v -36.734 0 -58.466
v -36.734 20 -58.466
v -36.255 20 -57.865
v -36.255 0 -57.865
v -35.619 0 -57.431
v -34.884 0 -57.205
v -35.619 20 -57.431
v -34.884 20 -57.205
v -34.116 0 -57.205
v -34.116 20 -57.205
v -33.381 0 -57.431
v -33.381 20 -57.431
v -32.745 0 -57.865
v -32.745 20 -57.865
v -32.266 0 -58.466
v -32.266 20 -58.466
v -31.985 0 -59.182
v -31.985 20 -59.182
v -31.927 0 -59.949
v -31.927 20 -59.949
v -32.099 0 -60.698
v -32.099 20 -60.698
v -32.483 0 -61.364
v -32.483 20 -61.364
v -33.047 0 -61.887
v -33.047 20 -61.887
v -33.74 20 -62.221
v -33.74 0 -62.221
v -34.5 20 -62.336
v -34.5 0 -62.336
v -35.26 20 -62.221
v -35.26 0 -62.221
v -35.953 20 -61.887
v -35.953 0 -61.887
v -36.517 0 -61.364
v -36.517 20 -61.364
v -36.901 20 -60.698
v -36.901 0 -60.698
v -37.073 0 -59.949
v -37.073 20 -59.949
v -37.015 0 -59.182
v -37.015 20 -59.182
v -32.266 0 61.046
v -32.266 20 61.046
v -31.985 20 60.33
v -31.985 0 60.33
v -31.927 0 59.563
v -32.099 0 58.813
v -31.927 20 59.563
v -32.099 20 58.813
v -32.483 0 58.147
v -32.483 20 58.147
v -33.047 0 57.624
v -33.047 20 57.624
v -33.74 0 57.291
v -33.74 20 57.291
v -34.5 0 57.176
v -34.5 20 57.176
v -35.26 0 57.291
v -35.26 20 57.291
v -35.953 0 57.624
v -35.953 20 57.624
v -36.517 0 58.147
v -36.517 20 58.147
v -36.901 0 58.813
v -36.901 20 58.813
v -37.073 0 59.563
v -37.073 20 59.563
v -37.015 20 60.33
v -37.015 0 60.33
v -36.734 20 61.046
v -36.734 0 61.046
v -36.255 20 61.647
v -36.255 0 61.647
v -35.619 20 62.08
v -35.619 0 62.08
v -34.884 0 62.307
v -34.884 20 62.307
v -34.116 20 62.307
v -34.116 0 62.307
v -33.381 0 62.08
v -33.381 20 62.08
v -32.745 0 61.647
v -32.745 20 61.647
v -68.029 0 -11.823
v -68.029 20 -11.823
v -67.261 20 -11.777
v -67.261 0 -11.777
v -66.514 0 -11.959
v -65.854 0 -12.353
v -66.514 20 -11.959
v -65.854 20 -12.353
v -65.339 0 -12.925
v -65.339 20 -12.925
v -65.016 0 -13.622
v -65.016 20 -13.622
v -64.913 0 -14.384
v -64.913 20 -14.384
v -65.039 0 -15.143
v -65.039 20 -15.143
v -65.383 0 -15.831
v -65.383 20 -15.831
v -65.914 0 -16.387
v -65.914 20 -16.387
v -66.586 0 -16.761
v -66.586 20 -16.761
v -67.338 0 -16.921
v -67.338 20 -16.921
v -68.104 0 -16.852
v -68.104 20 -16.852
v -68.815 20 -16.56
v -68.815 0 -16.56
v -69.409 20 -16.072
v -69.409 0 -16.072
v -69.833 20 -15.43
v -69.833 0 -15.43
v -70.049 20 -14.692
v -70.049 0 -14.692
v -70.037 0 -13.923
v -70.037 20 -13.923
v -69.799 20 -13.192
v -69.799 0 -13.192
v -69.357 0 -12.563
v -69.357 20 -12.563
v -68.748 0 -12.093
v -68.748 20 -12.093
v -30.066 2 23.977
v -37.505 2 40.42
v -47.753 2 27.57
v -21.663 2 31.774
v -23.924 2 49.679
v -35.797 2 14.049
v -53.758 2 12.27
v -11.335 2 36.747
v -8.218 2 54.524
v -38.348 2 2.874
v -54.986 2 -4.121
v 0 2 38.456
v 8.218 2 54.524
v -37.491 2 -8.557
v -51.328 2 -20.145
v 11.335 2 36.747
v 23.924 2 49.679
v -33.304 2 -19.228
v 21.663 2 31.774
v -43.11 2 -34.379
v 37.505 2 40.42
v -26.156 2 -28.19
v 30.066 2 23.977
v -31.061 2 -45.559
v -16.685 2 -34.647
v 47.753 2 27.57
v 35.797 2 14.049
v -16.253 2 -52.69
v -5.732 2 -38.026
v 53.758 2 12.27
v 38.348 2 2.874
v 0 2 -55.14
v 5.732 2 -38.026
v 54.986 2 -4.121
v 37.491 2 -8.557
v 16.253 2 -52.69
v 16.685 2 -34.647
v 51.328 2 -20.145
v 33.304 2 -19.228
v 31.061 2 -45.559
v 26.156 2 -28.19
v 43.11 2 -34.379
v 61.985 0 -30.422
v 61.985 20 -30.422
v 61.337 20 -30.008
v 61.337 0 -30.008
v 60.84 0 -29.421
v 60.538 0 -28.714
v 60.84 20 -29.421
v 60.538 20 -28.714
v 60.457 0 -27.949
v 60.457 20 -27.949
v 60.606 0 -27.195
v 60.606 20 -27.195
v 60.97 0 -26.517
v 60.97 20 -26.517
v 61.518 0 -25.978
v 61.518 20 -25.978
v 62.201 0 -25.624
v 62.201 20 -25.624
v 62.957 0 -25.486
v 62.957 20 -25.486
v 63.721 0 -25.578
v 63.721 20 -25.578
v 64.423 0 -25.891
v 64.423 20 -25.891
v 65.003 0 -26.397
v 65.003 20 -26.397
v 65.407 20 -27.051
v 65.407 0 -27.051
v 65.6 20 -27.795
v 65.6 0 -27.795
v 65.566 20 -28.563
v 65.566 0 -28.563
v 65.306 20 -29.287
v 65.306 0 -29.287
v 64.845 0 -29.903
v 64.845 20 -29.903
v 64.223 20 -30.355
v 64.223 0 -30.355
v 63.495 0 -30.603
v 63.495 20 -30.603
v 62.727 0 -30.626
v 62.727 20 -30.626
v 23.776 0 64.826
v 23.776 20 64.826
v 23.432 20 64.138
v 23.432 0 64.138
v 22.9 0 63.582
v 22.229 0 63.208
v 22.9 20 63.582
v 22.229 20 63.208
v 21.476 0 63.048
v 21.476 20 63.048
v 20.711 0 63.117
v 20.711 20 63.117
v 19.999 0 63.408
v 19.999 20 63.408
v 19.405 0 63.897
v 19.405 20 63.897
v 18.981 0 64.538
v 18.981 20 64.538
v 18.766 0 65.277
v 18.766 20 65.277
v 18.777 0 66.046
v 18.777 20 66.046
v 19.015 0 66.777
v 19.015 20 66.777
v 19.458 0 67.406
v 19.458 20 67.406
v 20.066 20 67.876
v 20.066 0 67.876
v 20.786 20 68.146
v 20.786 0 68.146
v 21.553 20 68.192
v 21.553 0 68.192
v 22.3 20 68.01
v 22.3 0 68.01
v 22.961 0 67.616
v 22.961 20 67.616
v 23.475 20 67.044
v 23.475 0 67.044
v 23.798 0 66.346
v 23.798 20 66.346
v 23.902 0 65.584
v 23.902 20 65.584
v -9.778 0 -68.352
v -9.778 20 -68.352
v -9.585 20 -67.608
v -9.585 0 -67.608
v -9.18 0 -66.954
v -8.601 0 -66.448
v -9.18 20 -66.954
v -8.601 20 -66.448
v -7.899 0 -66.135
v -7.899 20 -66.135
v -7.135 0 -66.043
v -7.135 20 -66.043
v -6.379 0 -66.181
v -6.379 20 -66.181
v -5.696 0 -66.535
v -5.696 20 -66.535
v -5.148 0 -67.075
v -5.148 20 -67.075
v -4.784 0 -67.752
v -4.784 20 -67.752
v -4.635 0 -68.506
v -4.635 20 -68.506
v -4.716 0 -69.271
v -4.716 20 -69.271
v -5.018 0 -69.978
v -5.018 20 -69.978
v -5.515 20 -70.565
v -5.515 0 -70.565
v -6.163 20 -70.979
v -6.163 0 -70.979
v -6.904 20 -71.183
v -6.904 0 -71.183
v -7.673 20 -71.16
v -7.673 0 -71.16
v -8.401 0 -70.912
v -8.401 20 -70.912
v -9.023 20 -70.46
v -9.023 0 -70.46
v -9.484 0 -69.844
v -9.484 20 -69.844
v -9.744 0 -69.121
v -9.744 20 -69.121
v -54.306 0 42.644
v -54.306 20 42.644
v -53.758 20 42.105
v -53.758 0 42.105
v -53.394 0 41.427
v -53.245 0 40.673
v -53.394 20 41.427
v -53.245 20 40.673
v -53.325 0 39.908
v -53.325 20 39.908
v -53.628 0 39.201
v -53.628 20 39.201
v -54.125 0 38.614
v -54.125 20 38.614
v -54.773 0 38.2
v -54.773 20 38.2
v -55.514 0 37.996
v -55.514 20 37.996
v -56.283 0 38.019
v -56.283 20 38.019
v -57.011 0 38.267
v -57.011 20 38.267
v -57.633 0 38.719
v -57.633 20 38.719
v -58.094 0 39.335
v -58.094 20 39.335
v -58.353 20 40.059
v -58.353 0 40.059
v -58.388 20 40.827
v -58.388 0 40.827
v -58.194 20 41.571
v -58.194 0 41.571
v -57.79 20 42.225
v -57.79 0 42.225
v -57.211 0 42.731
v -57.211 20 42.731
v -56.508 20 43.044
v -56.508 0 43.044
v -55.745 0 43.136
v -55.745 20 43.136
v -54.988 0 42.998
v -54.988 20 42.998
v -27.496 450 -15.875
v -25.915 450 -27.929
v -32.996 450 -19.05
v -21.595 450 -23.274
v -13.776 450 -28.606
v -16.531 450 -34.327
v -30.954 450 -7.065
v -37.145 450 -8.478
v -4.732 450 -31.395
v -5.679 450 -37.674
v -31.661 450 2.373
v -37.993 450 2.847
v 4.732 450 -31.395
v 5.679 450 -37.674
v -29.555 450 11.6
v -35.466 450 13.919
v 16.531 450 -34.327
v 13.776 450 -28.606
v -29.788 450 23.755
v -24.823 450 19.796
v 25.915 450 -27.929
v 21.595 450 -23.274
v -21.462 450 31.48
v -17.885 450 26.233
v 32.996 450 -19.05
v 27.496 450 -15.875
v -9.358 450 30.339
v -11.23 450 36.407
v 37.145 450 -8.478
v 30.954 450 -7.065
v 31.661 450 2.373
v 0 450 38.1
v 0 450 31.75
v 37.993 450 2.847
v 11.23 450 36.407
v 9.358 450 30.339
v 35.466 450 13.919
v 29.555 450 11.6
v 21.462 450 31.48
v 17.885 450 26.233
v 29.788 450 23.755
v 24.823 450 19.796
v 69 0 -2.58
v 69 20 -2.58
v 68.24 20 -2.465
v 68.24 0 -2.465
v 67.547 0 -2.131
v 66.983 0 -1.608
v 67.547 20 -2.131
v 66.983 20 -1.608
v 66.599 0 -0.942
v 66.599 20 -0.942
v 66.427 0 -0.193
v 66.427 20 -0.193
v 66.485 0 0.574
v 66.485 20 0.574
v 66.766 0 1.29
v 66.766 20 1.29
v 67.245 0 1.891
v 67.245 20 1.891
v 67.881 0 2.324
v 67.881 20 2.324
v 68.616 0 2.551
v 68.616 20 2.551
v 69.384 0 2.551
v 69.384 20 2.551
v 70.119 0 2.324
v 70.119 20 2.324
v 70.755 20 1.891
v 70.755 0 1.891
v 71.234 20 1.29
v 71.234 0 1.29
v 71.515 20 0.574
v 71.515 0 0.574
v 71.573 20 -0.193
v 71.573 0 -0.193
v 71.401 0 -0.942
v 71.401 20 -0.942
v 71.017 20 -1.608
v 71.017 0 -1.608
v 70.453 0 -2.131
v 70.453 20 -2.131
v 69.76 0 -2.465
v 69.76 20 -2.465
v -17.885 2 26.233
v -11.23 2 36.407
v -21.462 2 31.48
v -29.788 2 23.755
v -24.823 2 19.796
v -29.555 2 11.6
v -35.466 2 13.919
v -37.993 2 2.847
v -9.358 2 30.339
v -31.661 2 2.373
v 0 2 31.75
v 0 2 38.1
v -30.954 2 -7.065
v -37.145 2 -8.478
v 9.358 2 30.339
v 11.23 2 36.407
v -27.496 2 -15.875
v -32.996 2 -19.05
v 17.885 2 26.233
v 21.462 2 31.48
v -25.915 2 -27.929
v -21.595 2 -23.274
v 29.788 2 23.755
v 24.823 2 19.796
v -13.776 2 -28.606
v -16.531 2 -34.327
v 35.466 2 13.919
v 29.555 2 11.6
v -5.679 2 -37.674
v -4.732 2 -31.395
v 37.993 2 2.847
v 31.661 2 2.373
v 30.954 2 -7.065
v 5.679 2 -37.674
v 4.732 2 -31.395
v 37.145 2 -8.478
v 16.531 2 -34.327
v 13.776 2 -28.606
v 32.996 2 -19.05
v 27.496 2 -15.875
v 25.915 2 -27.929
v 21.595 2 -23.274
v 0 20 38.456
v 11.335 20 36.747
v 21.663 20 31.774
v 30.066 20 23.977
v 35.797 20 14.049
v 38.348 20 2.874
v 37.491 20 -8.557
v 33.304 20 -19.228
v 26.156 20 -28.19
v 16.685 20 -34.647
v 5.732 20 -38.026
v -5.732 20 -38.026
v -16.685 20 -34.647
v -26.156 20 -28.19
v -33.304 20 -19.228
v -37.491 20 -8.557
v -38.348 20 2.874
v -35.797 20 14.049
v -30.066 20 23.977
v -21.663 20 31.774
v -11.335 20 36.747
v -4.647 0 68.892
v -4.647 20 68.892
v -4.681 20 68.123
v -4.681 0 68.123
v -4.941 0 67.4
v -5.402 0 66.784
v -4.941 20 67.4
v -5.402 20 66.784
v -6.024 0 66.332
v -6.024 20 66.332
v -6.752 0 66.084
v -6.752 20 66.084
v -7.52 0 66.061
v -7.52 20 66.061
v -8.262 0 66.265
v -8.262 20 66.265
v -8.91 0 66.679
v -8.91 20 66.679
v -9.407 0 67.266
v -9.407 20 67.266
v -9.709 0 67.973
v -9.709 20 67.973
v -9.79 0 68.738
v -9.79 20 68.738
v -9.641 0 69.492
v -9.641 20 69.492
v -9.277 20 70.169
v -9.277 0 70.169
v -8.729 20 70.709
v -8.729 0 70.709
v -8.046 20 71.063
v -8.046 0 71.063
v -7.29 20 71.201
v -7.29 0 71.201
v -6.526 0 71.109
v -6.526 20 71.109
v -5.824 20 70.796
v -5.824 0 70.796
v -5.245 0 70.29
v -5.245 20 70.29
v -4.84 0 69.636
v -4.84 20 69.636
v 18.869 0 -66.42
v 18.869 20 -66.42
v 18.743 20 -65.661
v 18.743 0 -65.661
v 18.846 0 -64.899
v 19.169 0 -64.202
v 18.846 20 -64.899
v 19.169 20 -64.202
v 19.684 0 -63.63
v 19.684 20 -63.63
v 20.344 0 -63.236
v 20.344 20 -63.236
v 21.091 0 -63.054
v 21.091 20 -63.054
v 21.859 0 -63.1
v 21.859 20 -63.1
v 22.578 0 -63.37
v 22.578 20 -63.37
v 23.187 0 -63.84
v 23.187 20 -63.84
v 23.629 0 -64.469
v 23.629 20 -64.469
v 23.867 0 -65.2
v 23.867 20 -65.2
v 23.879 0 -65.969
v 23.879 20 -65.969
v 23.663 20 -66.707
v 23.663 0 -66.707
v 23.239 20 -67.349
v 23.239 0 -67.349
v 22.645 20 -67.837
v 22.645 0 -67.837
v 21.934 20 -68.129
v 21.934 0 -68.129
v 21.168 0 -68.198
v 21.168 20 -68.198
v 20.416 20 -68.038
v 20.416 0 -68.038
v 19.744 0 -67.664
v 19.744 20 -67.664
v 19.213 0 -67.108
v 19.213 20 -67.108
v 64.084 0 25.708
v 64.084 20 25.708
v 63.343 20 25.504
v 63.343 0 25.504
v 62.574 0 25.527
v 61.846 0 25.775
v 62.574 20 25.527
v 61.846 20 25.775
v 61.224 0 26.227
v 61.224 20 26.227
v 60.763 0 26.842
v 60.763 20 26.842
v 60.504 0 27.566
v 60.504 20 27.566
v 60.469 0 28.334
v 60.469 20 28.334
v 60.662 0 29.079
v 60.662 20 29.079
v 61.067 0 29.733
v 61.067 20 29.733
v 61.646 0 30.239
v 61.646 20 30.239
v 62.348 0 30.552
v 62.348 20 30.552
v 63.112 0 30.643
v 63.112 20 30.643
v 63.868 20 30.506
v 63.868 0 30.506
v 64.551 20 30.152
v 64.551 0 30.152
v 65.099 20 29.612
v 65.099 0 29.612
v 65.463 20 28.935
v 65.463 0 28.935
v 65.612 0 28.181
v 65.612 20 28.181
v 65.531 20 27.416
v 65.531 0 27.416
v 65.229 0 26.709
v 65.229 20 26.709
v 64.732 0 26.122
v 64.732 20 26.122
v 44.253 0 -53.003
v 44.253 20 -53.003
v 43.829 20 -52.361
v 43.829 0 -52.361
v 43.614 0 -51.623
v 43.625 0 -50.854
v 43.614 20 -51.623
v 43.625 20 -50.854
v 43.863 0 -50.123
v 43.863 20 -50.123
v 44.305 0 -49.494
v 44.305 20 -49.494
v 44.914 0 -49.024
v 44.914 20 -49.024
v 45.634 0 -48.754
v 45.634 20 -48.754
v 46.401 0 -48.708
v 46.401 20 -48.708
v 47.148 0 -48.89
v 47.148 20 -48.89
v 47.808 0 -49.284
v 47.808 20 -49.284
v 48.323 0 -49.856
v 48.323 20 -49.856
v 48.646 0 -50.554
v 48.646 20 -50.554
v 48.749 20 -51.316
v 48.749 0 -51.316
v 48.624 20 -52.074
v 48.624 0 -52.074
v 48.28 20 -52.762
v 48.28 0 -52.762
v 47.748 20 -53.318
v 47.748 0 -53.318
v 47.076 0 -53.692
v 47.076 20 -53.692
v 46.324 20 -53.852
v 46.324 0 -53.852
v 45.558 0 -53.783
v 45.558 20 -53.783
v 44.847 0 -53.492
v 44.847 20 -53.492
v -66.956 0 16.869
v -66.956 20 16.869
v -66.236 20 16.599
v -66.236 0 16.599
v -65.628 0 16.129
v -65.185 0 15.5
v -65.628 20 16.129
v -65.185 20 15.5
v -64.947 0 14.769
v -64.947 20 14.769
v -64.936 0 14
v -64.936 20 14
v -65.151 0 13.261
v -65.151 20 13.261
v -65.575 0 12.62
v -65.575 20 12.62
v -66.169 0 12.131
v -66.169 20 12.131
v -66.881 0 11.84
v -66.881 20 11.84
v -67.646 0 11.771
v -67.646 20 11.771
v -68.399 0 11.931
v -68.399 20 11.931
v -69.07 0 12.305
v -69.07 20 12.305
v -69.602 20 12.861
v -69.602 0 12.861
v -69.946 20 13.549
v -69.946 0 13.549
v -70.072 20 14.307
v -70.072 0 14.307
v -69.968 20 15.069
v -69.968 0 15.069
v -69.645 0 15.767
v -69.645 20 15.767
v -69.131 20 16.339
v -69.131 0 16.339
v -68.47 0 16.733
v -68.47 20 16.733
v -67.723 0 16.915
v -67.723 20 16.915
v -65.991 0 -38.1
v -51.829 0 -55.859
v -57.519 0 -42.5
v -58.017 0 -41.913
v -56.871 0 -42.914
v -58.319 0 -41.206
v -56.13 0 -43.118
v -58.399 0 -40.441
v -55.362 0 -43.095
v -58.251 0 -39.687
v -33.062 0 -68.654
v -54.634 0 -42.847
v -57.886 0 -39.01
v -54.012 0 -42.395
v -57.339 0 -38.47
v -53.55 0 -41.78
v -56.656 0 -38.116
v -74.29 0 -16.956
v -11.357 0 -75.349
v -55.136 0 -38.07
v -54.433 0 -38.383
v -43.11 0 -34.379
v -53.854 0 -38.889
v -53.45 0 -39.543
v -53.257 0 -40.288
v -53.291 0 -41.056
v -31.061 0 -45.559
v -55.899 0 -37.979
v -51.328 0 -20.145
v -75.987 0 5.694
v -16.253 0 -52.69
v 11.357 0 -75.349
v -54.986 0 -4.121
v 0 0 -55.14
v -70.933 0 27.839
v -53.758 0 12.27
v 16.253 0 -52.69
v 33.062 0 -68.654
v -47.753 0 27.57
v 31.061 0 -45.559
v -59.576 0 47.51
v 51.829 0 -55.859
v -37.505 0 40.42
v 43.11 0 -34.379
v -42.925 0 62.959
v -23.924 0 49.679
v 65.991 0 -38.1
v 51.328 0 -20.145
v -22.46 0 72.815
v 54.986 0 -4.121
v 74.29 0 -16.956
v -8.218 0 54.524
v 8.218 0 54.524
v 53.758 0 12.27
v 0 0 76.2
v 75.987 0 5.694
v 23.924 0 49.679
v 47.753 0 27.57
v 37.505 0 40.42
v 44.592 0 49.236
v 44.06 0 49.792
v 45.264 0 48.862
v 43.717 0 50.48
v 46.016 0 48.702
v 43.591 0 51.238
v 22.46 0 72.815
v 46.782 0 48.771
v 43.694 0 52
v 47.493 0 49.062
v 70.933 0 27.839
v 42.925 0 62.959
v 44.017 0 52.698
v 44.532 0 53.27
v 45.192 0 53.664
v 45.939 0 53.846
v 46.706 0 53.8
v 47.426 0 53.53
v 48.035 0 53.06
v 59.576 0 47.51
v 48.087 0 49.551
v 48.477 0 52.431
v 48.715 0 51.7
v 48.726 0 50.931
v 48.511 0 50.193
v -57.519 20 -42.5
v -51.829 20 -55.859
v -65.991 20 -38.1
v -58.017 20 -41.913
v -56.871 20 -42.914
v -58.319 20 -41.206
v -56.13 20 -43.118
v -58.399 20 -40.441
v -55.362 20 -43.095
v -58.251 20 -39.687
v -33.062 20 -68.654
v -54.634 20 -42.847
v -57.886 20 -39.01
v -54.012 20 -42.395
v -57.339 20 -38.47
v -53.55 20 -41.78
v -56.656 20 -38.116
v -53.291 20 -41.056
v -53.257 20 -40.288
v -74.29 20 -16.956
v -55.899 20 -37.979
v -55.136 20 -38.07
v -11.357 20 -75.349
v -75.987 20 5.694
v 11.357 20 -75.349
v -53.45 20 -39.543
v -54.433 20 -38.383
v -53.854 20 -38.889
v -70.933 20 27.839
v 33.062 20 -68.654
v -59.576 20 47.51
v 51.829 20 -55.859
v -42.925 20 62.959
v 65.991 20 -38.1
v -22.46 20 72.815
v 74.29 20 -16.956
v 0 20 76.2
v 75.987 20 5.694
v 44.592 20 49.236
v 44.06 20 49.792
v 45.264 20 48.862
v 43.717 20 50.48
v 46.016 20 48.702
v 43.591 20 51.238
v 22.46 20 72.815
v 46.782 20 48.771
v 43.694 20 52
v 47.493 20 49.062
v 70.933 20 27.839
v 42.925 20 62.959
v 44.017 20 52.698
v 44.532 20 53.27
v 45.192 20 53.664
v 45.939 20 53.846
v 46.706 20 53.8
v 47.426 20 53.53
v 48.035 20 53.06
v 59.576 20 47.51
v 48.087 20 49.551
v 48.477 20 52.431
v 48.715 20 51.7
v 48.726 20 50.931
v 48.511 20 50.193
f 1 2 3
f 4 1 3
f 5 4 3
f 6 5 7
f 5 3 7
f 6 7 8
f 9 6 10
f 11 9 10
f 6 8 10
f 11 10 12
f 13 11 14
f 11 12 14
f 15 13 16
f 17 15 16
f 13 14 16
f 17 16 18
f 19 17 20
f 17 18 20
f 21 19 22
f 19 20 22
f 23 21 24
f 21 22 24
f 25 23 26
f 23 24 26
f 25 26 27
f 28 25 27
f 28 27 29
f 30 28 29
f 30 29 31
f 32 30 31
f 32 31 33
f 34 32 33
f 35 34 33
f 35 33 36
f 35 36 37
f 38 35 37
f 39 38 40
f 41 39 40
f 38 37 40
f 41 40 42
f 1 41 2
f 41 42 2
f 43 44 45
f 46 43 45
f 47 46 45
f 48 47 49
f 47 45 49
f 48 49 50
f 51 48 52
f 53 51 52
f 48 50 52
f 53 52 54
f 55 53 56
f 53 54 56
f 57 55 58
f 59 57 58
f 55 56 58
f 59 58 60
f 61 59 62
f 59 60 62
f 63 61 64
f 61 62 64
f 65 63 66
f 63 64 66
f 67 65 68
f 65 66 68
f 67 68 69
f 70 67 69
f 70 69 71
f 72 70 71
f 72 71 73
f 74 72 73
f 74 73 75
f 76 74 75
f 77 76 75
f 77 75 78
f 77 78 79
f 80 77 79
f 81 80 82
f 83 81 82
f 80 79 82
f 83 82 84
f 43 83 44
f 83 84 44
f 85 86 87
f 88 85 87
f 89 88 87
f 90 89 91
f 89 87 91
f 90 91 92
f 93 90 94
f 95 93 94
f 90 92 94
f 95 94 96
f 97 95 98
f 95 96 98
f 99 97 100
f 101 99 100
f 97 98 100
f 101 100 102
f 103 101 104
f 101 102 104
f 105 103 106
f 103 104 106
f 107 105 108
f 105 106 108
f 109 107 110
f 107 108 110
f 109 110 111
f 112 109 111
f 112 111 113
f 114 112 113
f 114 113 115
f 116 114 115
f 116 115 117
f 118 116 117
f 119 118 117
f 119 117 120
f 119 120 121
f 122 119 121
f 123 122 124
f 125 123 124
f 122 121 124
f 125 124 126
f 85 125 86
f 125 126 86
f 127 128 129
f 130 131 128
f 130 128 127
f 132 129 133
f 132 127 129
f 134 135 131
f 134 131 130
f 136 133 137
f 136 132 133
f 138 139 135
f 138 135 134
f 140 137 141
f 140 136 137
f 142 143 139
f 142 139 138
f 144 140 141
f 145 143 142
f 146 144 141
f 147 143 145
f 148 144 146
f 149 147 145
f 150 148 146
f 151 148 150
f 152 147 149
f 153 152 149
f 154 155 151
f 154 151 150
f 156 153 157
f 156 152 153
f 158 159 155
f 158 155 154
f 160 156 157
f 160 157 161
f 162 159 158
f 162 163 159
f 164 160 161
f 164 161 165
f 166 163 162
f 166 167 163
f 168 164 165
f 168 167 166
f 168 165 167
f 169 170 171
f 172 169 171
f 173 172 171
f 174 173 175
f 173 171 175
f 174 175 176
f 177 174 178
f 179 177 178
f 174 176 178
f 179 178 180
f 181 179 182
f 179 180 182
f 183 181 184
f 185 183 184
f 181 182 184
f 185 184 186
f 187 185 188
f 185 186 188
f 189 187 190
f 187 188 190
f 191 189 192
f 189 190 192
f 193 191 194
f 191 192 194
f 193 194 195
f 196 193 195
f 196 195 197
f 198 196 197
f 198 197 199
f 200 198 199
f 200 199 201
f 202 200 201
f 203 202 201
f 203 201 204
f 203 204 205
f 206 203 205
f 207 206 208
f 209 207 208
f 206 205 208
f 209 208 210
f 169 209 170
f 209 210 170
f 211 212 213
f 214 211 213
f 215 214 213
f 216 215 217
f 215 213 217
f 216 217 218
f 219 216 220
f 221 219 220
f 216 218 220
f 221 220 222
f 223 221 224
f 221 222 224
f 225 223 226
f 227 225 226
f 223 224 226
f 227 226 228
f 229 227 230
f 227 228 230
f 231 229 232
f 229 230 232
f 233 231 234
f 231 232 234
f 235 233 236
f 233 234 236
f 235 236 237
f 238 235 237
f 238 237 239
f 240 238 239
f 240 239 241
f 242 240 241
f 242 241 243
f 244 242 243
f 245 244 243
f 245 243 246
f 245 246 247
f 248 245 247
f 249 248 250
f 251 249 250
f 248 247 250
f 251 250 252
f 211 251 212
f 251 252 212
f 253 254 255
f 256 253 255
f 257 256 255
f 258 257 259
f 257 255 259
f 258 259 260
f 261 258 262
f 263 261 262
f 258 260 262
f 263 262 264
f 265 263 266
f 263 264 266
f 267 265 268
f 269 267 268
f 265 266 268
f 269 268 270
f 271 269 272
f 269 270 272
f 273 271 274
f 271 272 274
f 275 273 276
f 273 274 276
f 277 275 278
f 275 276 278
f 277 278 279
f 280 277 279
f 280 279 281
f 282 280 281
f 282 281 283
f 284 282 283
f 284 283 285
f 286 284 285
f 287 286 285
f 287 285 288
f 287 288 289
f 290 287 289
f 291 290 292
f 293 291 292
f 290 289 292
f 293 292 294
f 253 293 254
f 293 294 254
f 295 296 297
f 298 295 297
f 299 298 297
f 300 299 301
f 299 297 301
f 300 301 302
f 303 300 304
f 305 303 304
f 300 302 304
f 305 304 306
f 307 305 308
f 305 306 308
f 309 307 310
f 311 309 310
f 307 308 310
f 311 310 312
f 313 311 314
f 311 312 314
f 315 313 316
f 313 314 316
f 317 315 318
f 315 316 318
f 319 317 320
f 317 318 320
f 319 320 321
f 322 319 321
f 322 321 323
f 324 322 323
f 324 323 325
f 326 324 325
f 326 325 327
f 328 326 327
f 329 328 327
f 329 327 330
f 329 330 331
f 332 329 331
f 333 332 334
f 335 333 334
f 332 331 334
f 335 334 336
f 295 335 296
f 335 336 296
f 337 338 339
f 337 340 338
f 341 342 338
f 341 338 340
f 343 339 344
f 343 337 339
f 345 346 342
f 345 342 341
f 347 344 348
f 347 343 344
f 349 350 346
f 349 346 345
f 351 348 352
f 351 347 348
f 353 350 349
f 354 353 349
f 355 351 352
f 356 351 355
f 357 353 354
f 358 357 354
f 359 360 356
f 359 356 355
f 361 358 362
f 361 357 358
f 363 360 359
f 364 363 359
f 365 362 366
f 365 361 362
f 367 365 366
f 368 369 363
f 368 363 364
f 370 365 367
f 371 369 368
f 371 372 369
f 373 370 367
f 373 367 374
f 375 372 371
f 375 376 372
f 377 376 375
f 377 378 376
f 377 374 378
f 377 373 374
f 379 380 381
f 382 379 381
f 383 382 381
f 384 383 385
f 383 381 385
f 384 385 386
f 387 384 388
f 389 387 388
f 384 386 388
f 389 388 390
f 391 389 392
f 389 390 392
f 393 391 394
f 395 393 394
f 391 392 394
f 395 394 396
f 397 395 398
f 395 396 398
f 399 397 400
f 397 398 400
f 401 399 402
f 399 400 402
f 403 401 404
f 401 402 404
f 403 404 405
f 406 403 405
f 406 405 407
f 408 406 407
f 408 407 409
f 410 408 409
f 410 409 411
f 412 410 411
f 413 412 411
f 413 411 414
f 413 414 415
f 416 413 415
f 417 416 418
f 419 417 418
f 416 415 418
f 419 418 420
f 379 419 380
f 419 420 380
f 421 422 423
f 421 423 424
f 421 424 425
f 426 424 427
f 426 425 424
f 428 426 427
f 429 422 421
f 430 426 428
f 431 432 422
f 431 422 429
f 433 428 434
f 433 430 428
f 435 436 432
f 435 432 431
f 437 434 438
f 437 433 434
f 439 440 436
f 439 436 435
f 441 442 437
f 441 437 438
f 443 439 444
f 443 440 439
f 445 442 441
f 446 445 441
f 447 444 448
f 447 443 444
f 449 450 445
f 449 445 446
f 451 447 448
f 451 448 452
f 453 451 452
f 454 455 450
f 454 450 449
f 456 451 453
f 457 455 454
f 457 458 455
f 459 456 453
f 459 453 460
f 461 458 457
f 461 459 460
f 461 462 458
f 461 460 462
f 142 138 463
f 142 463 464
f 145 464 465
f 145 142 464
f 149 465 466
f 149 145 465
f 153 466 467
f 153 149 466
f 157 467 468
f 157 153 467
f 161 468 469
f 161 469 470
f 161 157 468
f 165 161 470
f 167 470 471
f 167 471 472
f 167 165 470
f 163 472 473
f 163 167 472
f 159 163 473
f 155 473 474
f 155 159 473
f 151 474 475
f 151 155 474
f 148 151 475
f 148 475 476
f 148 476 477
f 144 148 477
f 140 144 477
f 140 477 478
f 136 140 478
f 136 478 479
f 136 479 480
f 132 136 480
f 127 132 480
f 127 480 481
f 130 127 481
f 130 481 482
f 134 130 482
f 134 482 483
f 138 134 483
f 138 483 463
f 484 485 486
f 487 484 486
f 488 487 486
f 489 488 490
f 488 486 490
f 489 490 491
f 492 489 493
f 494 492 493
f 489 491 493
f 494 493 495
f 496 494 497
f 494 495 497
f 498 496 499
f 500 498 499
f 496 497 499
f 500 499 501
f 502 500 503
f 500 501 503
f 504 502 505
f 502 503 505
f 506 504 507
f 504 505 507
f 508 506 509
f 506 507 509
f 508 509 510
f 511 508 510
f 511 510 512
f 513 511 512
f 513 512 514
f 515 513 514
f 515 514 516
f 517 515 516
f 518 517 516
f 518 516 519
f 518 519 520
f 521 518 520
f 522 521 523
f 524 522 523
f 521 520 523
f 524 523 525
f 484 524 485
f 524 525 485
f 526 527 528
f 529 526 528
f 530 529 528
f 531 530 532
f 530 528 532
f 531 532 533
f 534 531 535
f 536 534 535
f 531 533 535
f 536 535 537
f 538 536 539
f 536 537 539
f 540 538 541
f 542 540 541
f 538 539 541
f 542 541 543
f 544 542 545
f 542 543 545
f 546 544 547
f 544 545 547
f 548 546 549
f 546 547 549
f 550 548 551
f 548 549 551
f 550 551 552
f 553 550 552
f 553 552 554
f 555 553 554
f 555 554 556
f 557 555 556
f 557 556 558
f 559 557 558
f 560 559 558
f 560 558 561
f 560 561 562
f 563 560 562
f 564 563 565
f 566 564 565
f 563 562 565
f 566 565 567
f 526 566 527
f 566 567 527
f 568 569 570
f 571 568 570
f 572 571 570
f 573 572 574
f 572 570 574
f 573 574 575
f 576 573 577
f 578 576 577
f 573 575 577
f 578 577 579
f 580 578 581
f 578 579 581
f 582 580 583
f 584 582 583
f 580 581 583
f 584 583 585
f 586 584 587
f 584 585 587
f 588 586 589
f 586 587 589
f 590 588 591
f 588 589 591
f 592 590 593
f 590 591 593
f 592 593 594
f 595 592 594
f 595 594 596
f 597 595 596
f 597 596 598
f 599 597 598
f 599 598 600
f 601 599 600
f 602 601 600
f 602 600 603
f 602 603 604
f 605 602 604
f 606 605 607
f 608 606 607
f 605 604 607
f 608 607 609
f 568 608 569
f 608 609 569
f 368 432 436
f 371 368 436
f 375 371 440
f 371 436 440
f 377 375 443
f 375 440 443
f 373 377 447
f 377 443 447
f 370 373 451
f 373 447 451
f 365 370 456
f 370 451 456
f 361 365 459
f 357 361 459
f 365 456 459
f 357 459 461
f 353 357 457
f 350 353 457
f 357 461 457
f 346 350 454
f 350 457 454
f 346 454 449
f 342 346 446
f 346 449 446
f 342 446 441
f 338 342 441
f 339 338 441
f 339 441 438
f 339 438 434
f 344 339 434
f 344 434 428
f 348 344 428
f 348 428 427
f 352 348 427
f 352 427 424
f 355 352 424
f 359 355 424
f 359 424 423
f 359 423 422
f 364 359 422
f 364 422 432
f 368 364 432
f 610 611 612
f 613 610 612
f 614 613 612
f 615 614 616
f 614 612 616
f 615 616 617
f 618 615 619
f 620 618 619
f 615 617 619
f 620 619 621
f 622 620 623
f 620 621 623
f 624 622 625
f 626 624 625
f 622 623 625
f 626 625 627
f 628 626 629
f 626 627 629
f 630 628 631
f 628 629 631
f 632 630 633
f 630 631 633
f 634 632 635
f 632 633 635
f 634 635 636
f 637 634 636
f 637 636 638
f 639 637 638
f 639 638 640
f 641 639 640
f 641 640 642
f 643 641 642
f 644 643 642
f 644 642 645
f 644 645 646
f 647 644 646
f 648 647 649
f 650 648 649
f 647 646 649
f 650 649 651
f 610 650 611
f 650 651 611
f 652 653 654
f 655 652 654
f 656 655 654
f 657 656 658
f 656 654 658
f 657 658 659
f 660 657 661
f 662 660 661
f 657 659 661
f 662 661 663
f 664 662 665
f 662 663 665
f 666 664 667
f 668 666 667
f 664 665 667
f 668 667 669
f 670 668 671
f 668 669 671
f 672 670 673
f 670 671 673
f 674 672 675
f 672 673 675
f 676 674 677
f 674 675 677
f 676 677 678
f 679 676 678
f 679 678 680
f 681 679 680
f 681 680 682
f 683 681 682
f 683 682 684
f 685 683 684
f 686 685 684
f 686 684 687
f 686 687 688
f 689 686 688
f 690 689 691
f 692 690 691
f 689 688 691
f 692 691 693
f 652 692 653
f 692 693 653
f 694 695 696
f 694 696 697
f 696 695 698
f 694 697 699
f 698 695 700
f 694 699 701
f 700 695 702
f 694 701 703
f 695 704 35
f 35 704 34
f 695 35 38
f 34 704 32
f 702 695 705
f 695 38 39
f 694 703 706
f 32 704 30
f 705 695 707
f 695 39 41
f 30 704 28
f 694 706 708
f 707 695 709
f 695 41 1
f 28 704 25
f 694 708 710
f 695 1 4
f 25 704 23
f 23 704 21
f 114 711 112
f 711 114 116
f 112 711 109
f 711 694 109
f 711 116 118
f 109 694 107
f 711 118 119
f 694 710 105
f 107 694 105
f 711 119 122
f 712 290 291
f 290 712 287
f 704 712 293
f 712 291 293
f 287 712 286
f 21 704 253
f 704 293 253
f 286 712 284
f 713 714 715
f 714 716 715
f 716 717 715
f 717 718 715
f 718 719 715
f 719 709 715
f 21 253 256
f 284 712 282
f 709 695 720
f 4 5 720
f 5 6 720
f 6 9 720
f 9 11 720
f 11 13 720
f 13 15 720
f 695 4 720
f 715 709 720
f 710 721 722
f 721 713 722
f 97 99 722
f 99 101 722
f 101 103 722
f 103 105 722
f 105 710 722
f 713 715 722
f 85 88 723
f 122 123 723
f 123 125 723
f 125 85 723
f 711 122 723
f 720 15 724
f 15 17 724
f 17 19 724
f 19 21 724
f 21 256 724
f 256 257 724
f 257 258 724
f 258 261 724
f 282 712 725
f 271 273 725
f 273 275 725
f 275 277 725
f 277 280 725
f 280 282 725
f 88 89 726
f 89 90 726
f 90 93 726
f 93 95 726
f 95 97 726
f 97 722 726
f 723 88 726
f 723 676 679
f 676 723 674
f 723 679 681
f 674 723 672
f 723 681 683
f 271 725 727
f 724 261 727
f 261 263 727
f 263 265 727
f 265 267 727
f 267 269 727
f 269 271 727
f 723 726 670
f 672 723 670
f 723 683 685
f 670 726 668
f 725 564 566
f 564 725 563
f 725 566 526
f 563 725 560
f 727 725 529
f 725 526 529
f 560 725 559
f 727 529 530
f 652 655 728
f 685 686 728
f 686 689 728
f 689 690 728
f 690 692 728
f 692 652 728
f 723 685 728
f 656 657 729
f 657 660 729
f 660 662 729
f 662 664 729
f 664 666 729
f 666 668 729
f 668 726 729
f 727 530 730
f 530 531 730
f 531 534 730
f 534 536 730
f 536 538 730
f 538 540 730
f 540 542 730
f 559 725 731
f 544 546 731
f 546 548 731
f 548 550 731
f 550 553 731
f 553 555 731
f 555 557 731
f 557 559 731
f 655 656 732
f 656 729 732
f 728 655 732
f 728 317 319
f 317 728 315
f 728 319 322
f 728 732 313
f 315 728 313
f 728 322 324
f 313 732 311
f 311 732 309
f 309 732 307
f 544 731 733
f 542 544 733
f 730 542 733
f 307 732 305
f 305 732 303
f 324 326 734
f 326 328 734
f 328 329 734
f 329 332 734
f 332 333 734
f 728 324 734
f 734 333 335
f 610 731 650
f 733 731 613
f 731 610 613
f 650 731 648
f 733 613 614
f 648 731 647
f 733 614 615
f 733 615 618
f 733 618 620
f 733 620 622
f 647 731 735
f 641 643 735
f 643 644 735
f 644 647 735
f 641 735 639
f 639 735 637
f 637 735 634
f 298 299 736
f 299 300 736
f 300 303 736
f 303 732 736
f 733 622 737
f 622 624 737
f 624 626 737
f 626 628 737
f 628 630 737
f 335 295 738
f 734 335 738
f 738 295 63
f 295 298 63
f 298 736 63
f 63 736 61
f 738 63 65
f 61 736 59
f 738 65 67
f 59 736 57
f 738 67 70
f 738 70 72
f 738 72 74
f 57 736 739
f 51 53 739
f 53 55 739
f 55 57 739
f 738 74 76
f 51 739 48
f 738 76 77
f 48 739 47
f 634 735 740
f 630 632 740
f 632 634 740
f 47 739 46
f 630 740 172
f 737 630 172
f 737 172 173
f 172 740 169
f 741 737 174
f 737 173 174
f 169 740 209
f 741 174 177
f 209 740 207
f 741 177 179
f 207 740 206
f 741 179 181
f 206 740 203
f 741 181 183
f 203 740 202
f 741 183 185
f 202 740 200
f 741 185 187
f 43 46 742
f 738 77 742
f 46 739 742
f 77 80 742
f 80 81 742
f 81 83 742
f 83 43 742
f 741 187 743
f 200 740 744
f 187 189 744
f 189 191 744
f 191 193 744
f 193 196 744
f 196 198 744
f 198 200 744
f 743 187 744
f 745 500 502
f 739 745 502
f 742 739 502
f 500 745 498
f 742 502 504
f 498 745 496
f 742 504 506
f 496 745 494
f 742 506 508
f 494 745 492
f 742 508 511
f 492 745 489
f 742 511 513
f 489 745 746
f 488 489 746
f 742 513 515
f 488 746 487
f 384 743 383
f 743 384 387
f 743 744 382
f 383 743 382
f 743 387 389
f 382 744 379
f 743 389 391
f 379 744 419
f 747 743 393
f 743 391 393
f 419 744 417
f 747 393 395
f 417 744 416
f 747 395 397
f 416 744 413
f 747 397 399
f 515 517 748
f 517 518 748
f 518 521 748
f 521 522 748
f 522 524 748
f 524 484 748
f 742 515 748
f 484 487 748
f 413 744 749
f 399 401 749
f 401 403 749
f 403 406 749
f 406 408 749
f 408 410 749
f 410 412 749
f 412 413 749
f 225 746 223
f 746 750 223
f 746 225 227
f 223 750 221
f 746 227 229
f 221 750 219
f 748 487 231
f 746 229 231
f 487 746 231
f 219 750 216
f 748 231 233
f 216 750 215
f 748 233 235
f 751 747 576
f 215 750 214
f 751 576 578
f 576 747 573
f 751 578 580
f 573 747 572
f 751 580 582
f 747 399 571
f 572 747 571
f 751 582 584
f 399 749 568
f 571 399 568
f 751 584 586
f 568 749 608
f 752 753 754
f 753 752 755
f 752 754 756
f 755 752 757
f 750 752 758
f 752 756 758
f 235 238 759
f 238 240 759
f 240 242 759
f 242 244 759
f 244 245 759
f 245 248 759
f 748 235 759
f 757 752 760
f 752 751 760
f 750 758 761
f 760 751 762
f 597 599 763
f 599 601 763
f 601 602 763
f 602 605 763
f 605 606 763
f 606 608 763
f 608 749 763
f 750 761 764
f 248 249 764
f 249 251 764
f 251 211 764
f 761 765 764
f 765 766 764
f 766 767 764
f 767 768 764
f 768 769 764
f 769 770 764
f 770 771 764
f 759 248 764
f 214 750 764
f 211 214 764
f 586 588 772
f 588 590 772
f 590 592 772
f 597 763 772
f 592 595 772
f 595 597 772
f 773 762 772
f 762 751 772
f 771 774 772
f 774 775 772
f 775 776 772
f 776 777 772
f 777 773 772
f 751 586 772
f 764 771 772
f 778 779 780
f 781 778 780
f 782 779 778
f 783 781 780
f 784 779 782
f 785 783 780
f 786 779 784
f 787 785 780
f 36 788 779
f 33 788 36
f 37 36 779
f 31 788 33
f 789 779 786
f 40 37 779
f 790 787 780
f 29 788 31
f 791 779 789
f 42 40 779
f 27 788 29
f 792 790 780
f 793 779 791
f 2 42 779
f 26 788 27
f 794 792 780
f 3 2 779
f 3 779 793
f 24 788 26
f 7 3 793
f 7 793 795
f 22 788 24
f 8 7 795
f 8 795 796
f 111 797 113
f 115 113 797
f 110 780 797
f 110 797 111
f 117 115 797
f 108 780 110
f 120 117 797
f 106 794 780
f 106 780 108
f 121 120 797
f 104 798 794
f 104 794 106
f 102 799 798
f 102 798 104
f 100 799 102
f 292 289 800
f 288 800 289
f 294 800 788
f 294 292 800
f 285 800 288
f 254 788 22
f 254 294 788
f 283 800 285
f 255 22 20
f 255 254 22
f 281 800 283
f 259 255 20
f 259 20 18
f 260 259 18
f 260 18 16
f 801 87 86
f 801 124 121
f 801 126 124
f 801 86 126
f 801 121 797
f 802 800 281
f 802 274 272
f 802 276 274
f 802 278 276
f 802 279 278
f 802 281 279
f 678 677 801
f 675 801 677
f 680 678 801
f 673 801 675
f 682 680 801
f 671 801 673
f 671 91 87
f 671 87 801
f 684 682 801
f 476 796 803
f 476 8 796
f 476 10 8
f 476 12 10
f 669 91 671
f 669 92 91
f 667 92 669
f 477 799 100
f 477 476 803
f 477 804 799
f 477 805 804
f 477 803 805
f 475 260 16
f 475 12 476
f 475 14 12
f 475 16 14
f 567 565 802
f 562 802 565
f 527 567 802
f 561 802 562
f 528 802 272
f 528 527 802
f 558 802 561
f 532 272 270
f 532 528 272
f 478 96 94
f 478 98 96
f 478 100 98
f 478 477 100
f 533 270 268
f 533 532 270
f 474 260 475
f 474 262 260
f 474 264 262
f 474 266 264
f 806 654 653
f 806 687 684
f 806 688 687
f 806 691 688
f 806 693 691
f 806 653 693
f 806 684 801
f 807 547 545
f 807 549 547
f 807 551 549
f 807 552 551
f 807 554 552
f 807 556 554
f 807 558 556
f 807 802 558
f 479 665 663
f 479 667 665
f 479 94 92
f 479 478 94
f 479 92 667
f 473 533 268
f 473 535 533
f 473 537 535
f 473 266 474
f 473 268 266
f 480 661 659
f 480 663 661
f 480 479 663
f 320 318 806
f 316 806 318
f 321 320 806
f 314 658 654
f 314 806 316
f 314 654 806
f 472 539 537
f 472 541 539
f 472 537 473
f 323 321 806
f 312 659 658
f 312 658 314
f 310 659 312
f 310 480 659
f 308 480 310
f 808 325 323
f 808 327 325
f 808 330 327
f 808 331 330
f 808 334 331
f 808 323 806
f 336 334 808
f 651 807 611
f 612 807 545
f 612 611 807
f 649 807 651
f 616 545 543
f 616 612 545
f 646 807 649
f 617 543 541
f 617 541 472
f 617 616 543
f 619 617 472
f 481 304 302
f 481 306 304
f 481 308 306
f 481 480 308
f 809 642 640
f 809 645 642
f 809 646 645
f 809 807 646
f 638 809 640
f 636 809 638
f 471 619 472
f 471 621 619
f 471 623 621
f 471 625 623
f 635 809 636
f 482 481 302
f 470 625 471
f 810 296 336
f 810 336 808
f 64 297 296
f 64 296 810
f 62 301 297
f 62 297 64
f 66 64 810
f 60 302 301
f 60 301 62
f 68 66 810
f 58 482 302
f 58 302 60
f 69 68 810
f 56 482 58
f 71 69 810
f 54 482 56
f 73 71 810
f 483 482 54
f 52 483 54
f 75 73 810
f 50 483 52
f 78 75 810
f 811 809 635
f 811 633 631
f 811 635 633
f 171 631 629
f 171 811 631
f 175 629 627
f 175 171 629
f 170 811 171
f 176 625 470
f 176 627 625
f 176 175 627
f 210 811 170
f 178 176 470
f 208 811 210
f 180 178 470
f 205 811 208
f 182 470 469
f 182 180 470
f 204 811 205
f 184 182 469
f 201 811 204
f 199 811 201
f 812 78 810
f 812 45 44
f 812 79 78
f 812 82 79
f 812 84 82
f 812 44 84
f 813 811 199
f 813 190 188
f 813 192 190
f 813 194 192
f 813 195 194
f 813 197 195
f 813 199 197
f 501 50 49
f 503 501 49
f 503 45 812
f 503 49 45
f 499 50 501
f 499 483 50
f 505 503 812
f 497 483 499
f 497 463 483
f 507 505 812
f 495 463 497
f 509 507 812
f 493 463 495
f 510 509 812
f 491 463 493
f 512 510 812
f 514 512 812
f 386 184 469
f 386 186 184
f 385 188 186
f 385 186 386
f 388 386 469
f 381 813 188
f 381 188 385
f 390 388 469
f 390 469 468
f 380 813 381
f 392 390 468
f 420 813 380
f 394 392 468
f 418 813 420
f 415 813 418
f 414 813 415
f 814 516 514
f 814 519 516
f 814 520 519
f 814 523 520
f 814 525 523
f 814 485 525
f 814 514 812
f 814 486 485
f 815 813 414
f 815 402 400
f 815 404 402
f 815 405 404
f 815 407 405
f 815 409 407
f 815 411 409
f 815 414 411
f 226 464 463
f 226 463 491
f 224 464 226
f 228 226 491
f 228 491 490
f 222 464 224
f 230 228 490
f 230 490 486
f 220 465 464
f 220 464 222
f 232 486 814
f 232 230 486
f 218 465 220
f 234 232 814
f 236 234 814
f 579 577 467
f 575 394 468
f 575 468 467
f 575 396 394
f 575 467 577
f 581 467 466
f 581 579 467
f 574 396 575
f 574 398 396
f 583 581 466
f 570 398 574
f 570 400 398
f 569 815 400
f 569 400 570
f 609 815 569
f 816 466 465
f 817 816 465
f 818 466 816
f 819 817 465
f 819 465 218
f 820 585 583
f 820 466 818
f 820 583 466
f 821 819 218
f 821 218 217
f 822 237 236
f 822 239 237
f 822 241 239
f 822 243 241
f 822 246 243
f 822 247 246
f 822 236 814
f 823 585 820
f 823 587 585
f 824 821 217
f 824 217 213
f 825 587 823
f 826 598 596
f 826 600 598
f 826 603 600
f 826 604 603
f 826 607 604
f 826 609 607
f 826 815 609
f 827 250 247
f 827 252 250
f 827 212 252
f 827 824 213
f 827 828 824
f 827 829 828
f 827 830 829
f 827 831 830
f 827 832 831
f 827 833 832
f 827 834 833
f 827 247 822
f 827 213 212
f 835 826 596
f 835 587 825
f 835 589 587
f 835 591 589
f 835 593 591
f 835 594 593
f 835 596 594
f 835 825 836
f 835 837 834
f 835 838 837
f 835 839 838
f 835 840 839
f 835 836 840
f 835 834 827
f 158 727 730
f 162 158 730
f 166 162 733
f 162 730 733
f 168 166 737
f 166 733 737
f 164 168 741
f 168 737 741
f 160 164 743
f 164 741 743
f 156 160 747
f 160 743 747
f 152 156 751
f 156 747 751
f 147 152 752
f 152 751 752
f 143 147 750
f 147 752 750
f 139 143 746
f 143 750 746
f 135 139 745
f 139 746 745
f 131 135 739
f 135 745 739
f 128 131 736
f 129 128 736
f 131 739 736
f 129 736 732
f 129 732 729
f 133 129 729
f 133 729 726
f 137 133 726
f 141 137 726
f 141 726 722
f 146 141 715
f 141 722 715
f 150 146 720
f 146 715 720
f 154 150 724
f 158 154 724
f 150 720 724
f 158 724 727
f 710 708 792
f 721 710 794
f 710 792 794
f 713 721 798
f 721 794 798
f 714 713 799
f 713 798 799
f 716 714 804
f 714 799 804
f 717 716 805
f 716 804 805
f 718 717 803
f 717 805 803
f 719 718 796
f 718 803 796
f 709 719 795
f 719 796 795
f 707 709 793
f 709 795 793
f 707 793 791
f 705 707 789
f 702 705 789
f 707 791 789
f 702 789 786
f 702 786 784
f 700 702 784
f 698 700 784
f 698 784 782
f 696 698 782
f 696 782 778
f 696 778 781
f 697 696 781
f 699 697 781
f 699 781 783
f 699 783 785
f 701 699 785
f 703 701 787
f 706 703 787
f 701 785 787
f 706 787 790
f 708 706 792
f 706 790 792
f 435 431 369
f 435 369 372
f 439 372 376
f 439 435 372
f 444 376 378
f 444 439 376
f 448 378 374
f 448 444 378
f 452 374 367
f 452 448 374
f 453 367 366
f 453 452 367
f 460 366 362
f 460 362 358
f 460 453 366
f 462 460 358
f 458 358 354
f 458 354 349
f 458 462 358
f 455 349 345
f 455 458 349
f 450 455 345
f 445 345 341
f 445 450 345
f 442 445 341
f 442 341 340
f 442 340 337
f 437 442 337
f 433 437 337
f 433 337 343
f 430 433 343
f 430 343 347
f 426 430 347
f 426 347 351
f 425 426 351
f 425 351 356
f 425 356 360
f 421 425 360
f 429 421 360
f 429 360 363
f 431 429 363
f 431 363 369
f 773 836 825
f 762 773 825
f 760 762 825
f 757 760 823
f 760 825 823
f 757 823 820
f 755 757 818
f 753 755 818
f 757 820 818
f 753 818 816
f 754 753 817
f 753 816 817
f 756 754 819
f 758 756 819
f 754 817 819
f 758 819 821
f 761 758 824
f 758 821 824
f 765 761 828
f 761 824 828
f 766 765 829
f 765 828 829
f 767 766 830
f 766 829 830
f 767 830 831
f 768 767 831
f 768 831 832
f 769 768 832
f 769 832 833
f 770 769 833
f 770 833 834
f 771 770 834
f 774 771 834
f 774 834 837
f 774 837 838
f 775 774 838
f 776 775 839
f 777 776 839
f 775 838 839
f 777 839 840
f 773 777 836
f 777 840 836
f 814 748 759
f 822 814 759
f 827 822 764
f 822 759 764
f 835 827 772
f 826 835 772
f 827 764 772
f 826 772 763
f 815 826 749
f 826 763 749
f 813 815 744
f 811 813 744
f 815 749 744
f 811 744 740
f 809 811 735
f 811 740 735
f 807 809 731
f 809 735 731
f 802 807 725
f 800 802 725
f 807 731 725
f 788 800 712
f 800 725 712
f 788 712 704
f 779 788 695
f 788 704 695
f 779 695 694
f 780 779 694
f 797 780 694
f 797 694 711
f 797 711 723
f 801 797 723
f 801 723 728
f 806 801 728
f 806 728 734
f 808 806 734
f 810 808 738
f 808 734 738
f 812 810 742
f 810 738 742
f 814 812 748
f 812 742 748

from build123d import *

# Parameters (mm, degrees)
SKETCH1_R           = 38.1
SKETCH1_R_2         = 31.75
BOSS_EXTRUDE1_DEPTH = 450
SKETCH2_R           = 76.2
SKETCH2_R_2         = 38.4556
BOSS_EXTRUDE2_DEPTH = 20
SKETCH5_W           = 2.579751
SKETCH5_H           = 450
CIRPATTERN1_COUNT   = 15
SKETCH6_R           = 55.14
CUT_EXTRUDE1_DEPTH  = 2


with BuildPart() as part:
    # Sketch1 → Boss-Extrude1 (new body)
    with BuildSketch(Plane(origin=(0, 0, 0), x_dir=(1, 0, 0), z_dir=(0, 1, 0))):
        Circle(SKETCH1_R)
        Circle(SKETCH1_R_2, mode=Mode.SUBTRACT)
    extrude(amount=BOSS_EXTRUDE1_DEPTH)


with BuildPart() as body_2:
    # Sketch2 → Boss-Extrude2 (new body)
    with BuildSketch(Plane(origin=(0, 0, 0), x_dir=(1, 0, 0), z_dir=(0, 1, 0))):
        Circle(SKETCH2_R)
        Circle(SKETCH2_R_2, mode=Mode.SUBTRACT)
    extrude(amount=BOSS_EXTRUDE2_DEPTH)

    # Sketch5 → 13/64 (0.20313) Diameter Hole1 (revolve, cut)
    with BuildSketch(Plane(origin=(69, 0, 0), x_dir=(0, 0, -1), z_dir=(1, 0, 0))):
        with Locations((1.2898755, 225)):
            Rectangle(SKETCH5_W, SKETCH5_H)
    f_13_64_0_20313_diameter_hole1 = revolve(axis=Axis((69, -6.35, 0), (0, 1, 0)), mode=Mode.SUBTRACT)

    # CirPattern1: 13/64 (0.20313) Diameter Hole1 ×15 about axis
    cirpattern1_axis = Axis((0, 472.5, 0), (0, -1, 0))
    for i in range(1, CIRPATTERN1_COUNT):
        add(f_13_64_0_20313_diameter_hole1.rotate(cirpattern1_axis, i * 360 / CIRPATTERN1_COUNT), mode=Mode.SUBTRACT)


with BuildPart() as cut_extrude1_tool:
    # Sketch6 → Cut-Extrude1 (new body)
    with BuildSketch(Plane.XZ):
        Circle(SKETCH6_R)
    extrude(amount=-CUT_EXTRUDE1_DEPTH)


with BuildPart() as part_1:
    add(part.part)

    # Cut-Extrude1: cut by cut_extrude1_tool
    add(cut_extrude1_tool.part, mode=Mode.SUBTRACT)


with BuildPart() as body_2_1:
    add(body_2.part)

    # Cut-Extrude1: cut by cut_extrude1_tool
    add(cut_extrude1_tool.part, mode=Mode.SUBTRACT)


solid = Compound([part_1.part, body_2_1.part])
